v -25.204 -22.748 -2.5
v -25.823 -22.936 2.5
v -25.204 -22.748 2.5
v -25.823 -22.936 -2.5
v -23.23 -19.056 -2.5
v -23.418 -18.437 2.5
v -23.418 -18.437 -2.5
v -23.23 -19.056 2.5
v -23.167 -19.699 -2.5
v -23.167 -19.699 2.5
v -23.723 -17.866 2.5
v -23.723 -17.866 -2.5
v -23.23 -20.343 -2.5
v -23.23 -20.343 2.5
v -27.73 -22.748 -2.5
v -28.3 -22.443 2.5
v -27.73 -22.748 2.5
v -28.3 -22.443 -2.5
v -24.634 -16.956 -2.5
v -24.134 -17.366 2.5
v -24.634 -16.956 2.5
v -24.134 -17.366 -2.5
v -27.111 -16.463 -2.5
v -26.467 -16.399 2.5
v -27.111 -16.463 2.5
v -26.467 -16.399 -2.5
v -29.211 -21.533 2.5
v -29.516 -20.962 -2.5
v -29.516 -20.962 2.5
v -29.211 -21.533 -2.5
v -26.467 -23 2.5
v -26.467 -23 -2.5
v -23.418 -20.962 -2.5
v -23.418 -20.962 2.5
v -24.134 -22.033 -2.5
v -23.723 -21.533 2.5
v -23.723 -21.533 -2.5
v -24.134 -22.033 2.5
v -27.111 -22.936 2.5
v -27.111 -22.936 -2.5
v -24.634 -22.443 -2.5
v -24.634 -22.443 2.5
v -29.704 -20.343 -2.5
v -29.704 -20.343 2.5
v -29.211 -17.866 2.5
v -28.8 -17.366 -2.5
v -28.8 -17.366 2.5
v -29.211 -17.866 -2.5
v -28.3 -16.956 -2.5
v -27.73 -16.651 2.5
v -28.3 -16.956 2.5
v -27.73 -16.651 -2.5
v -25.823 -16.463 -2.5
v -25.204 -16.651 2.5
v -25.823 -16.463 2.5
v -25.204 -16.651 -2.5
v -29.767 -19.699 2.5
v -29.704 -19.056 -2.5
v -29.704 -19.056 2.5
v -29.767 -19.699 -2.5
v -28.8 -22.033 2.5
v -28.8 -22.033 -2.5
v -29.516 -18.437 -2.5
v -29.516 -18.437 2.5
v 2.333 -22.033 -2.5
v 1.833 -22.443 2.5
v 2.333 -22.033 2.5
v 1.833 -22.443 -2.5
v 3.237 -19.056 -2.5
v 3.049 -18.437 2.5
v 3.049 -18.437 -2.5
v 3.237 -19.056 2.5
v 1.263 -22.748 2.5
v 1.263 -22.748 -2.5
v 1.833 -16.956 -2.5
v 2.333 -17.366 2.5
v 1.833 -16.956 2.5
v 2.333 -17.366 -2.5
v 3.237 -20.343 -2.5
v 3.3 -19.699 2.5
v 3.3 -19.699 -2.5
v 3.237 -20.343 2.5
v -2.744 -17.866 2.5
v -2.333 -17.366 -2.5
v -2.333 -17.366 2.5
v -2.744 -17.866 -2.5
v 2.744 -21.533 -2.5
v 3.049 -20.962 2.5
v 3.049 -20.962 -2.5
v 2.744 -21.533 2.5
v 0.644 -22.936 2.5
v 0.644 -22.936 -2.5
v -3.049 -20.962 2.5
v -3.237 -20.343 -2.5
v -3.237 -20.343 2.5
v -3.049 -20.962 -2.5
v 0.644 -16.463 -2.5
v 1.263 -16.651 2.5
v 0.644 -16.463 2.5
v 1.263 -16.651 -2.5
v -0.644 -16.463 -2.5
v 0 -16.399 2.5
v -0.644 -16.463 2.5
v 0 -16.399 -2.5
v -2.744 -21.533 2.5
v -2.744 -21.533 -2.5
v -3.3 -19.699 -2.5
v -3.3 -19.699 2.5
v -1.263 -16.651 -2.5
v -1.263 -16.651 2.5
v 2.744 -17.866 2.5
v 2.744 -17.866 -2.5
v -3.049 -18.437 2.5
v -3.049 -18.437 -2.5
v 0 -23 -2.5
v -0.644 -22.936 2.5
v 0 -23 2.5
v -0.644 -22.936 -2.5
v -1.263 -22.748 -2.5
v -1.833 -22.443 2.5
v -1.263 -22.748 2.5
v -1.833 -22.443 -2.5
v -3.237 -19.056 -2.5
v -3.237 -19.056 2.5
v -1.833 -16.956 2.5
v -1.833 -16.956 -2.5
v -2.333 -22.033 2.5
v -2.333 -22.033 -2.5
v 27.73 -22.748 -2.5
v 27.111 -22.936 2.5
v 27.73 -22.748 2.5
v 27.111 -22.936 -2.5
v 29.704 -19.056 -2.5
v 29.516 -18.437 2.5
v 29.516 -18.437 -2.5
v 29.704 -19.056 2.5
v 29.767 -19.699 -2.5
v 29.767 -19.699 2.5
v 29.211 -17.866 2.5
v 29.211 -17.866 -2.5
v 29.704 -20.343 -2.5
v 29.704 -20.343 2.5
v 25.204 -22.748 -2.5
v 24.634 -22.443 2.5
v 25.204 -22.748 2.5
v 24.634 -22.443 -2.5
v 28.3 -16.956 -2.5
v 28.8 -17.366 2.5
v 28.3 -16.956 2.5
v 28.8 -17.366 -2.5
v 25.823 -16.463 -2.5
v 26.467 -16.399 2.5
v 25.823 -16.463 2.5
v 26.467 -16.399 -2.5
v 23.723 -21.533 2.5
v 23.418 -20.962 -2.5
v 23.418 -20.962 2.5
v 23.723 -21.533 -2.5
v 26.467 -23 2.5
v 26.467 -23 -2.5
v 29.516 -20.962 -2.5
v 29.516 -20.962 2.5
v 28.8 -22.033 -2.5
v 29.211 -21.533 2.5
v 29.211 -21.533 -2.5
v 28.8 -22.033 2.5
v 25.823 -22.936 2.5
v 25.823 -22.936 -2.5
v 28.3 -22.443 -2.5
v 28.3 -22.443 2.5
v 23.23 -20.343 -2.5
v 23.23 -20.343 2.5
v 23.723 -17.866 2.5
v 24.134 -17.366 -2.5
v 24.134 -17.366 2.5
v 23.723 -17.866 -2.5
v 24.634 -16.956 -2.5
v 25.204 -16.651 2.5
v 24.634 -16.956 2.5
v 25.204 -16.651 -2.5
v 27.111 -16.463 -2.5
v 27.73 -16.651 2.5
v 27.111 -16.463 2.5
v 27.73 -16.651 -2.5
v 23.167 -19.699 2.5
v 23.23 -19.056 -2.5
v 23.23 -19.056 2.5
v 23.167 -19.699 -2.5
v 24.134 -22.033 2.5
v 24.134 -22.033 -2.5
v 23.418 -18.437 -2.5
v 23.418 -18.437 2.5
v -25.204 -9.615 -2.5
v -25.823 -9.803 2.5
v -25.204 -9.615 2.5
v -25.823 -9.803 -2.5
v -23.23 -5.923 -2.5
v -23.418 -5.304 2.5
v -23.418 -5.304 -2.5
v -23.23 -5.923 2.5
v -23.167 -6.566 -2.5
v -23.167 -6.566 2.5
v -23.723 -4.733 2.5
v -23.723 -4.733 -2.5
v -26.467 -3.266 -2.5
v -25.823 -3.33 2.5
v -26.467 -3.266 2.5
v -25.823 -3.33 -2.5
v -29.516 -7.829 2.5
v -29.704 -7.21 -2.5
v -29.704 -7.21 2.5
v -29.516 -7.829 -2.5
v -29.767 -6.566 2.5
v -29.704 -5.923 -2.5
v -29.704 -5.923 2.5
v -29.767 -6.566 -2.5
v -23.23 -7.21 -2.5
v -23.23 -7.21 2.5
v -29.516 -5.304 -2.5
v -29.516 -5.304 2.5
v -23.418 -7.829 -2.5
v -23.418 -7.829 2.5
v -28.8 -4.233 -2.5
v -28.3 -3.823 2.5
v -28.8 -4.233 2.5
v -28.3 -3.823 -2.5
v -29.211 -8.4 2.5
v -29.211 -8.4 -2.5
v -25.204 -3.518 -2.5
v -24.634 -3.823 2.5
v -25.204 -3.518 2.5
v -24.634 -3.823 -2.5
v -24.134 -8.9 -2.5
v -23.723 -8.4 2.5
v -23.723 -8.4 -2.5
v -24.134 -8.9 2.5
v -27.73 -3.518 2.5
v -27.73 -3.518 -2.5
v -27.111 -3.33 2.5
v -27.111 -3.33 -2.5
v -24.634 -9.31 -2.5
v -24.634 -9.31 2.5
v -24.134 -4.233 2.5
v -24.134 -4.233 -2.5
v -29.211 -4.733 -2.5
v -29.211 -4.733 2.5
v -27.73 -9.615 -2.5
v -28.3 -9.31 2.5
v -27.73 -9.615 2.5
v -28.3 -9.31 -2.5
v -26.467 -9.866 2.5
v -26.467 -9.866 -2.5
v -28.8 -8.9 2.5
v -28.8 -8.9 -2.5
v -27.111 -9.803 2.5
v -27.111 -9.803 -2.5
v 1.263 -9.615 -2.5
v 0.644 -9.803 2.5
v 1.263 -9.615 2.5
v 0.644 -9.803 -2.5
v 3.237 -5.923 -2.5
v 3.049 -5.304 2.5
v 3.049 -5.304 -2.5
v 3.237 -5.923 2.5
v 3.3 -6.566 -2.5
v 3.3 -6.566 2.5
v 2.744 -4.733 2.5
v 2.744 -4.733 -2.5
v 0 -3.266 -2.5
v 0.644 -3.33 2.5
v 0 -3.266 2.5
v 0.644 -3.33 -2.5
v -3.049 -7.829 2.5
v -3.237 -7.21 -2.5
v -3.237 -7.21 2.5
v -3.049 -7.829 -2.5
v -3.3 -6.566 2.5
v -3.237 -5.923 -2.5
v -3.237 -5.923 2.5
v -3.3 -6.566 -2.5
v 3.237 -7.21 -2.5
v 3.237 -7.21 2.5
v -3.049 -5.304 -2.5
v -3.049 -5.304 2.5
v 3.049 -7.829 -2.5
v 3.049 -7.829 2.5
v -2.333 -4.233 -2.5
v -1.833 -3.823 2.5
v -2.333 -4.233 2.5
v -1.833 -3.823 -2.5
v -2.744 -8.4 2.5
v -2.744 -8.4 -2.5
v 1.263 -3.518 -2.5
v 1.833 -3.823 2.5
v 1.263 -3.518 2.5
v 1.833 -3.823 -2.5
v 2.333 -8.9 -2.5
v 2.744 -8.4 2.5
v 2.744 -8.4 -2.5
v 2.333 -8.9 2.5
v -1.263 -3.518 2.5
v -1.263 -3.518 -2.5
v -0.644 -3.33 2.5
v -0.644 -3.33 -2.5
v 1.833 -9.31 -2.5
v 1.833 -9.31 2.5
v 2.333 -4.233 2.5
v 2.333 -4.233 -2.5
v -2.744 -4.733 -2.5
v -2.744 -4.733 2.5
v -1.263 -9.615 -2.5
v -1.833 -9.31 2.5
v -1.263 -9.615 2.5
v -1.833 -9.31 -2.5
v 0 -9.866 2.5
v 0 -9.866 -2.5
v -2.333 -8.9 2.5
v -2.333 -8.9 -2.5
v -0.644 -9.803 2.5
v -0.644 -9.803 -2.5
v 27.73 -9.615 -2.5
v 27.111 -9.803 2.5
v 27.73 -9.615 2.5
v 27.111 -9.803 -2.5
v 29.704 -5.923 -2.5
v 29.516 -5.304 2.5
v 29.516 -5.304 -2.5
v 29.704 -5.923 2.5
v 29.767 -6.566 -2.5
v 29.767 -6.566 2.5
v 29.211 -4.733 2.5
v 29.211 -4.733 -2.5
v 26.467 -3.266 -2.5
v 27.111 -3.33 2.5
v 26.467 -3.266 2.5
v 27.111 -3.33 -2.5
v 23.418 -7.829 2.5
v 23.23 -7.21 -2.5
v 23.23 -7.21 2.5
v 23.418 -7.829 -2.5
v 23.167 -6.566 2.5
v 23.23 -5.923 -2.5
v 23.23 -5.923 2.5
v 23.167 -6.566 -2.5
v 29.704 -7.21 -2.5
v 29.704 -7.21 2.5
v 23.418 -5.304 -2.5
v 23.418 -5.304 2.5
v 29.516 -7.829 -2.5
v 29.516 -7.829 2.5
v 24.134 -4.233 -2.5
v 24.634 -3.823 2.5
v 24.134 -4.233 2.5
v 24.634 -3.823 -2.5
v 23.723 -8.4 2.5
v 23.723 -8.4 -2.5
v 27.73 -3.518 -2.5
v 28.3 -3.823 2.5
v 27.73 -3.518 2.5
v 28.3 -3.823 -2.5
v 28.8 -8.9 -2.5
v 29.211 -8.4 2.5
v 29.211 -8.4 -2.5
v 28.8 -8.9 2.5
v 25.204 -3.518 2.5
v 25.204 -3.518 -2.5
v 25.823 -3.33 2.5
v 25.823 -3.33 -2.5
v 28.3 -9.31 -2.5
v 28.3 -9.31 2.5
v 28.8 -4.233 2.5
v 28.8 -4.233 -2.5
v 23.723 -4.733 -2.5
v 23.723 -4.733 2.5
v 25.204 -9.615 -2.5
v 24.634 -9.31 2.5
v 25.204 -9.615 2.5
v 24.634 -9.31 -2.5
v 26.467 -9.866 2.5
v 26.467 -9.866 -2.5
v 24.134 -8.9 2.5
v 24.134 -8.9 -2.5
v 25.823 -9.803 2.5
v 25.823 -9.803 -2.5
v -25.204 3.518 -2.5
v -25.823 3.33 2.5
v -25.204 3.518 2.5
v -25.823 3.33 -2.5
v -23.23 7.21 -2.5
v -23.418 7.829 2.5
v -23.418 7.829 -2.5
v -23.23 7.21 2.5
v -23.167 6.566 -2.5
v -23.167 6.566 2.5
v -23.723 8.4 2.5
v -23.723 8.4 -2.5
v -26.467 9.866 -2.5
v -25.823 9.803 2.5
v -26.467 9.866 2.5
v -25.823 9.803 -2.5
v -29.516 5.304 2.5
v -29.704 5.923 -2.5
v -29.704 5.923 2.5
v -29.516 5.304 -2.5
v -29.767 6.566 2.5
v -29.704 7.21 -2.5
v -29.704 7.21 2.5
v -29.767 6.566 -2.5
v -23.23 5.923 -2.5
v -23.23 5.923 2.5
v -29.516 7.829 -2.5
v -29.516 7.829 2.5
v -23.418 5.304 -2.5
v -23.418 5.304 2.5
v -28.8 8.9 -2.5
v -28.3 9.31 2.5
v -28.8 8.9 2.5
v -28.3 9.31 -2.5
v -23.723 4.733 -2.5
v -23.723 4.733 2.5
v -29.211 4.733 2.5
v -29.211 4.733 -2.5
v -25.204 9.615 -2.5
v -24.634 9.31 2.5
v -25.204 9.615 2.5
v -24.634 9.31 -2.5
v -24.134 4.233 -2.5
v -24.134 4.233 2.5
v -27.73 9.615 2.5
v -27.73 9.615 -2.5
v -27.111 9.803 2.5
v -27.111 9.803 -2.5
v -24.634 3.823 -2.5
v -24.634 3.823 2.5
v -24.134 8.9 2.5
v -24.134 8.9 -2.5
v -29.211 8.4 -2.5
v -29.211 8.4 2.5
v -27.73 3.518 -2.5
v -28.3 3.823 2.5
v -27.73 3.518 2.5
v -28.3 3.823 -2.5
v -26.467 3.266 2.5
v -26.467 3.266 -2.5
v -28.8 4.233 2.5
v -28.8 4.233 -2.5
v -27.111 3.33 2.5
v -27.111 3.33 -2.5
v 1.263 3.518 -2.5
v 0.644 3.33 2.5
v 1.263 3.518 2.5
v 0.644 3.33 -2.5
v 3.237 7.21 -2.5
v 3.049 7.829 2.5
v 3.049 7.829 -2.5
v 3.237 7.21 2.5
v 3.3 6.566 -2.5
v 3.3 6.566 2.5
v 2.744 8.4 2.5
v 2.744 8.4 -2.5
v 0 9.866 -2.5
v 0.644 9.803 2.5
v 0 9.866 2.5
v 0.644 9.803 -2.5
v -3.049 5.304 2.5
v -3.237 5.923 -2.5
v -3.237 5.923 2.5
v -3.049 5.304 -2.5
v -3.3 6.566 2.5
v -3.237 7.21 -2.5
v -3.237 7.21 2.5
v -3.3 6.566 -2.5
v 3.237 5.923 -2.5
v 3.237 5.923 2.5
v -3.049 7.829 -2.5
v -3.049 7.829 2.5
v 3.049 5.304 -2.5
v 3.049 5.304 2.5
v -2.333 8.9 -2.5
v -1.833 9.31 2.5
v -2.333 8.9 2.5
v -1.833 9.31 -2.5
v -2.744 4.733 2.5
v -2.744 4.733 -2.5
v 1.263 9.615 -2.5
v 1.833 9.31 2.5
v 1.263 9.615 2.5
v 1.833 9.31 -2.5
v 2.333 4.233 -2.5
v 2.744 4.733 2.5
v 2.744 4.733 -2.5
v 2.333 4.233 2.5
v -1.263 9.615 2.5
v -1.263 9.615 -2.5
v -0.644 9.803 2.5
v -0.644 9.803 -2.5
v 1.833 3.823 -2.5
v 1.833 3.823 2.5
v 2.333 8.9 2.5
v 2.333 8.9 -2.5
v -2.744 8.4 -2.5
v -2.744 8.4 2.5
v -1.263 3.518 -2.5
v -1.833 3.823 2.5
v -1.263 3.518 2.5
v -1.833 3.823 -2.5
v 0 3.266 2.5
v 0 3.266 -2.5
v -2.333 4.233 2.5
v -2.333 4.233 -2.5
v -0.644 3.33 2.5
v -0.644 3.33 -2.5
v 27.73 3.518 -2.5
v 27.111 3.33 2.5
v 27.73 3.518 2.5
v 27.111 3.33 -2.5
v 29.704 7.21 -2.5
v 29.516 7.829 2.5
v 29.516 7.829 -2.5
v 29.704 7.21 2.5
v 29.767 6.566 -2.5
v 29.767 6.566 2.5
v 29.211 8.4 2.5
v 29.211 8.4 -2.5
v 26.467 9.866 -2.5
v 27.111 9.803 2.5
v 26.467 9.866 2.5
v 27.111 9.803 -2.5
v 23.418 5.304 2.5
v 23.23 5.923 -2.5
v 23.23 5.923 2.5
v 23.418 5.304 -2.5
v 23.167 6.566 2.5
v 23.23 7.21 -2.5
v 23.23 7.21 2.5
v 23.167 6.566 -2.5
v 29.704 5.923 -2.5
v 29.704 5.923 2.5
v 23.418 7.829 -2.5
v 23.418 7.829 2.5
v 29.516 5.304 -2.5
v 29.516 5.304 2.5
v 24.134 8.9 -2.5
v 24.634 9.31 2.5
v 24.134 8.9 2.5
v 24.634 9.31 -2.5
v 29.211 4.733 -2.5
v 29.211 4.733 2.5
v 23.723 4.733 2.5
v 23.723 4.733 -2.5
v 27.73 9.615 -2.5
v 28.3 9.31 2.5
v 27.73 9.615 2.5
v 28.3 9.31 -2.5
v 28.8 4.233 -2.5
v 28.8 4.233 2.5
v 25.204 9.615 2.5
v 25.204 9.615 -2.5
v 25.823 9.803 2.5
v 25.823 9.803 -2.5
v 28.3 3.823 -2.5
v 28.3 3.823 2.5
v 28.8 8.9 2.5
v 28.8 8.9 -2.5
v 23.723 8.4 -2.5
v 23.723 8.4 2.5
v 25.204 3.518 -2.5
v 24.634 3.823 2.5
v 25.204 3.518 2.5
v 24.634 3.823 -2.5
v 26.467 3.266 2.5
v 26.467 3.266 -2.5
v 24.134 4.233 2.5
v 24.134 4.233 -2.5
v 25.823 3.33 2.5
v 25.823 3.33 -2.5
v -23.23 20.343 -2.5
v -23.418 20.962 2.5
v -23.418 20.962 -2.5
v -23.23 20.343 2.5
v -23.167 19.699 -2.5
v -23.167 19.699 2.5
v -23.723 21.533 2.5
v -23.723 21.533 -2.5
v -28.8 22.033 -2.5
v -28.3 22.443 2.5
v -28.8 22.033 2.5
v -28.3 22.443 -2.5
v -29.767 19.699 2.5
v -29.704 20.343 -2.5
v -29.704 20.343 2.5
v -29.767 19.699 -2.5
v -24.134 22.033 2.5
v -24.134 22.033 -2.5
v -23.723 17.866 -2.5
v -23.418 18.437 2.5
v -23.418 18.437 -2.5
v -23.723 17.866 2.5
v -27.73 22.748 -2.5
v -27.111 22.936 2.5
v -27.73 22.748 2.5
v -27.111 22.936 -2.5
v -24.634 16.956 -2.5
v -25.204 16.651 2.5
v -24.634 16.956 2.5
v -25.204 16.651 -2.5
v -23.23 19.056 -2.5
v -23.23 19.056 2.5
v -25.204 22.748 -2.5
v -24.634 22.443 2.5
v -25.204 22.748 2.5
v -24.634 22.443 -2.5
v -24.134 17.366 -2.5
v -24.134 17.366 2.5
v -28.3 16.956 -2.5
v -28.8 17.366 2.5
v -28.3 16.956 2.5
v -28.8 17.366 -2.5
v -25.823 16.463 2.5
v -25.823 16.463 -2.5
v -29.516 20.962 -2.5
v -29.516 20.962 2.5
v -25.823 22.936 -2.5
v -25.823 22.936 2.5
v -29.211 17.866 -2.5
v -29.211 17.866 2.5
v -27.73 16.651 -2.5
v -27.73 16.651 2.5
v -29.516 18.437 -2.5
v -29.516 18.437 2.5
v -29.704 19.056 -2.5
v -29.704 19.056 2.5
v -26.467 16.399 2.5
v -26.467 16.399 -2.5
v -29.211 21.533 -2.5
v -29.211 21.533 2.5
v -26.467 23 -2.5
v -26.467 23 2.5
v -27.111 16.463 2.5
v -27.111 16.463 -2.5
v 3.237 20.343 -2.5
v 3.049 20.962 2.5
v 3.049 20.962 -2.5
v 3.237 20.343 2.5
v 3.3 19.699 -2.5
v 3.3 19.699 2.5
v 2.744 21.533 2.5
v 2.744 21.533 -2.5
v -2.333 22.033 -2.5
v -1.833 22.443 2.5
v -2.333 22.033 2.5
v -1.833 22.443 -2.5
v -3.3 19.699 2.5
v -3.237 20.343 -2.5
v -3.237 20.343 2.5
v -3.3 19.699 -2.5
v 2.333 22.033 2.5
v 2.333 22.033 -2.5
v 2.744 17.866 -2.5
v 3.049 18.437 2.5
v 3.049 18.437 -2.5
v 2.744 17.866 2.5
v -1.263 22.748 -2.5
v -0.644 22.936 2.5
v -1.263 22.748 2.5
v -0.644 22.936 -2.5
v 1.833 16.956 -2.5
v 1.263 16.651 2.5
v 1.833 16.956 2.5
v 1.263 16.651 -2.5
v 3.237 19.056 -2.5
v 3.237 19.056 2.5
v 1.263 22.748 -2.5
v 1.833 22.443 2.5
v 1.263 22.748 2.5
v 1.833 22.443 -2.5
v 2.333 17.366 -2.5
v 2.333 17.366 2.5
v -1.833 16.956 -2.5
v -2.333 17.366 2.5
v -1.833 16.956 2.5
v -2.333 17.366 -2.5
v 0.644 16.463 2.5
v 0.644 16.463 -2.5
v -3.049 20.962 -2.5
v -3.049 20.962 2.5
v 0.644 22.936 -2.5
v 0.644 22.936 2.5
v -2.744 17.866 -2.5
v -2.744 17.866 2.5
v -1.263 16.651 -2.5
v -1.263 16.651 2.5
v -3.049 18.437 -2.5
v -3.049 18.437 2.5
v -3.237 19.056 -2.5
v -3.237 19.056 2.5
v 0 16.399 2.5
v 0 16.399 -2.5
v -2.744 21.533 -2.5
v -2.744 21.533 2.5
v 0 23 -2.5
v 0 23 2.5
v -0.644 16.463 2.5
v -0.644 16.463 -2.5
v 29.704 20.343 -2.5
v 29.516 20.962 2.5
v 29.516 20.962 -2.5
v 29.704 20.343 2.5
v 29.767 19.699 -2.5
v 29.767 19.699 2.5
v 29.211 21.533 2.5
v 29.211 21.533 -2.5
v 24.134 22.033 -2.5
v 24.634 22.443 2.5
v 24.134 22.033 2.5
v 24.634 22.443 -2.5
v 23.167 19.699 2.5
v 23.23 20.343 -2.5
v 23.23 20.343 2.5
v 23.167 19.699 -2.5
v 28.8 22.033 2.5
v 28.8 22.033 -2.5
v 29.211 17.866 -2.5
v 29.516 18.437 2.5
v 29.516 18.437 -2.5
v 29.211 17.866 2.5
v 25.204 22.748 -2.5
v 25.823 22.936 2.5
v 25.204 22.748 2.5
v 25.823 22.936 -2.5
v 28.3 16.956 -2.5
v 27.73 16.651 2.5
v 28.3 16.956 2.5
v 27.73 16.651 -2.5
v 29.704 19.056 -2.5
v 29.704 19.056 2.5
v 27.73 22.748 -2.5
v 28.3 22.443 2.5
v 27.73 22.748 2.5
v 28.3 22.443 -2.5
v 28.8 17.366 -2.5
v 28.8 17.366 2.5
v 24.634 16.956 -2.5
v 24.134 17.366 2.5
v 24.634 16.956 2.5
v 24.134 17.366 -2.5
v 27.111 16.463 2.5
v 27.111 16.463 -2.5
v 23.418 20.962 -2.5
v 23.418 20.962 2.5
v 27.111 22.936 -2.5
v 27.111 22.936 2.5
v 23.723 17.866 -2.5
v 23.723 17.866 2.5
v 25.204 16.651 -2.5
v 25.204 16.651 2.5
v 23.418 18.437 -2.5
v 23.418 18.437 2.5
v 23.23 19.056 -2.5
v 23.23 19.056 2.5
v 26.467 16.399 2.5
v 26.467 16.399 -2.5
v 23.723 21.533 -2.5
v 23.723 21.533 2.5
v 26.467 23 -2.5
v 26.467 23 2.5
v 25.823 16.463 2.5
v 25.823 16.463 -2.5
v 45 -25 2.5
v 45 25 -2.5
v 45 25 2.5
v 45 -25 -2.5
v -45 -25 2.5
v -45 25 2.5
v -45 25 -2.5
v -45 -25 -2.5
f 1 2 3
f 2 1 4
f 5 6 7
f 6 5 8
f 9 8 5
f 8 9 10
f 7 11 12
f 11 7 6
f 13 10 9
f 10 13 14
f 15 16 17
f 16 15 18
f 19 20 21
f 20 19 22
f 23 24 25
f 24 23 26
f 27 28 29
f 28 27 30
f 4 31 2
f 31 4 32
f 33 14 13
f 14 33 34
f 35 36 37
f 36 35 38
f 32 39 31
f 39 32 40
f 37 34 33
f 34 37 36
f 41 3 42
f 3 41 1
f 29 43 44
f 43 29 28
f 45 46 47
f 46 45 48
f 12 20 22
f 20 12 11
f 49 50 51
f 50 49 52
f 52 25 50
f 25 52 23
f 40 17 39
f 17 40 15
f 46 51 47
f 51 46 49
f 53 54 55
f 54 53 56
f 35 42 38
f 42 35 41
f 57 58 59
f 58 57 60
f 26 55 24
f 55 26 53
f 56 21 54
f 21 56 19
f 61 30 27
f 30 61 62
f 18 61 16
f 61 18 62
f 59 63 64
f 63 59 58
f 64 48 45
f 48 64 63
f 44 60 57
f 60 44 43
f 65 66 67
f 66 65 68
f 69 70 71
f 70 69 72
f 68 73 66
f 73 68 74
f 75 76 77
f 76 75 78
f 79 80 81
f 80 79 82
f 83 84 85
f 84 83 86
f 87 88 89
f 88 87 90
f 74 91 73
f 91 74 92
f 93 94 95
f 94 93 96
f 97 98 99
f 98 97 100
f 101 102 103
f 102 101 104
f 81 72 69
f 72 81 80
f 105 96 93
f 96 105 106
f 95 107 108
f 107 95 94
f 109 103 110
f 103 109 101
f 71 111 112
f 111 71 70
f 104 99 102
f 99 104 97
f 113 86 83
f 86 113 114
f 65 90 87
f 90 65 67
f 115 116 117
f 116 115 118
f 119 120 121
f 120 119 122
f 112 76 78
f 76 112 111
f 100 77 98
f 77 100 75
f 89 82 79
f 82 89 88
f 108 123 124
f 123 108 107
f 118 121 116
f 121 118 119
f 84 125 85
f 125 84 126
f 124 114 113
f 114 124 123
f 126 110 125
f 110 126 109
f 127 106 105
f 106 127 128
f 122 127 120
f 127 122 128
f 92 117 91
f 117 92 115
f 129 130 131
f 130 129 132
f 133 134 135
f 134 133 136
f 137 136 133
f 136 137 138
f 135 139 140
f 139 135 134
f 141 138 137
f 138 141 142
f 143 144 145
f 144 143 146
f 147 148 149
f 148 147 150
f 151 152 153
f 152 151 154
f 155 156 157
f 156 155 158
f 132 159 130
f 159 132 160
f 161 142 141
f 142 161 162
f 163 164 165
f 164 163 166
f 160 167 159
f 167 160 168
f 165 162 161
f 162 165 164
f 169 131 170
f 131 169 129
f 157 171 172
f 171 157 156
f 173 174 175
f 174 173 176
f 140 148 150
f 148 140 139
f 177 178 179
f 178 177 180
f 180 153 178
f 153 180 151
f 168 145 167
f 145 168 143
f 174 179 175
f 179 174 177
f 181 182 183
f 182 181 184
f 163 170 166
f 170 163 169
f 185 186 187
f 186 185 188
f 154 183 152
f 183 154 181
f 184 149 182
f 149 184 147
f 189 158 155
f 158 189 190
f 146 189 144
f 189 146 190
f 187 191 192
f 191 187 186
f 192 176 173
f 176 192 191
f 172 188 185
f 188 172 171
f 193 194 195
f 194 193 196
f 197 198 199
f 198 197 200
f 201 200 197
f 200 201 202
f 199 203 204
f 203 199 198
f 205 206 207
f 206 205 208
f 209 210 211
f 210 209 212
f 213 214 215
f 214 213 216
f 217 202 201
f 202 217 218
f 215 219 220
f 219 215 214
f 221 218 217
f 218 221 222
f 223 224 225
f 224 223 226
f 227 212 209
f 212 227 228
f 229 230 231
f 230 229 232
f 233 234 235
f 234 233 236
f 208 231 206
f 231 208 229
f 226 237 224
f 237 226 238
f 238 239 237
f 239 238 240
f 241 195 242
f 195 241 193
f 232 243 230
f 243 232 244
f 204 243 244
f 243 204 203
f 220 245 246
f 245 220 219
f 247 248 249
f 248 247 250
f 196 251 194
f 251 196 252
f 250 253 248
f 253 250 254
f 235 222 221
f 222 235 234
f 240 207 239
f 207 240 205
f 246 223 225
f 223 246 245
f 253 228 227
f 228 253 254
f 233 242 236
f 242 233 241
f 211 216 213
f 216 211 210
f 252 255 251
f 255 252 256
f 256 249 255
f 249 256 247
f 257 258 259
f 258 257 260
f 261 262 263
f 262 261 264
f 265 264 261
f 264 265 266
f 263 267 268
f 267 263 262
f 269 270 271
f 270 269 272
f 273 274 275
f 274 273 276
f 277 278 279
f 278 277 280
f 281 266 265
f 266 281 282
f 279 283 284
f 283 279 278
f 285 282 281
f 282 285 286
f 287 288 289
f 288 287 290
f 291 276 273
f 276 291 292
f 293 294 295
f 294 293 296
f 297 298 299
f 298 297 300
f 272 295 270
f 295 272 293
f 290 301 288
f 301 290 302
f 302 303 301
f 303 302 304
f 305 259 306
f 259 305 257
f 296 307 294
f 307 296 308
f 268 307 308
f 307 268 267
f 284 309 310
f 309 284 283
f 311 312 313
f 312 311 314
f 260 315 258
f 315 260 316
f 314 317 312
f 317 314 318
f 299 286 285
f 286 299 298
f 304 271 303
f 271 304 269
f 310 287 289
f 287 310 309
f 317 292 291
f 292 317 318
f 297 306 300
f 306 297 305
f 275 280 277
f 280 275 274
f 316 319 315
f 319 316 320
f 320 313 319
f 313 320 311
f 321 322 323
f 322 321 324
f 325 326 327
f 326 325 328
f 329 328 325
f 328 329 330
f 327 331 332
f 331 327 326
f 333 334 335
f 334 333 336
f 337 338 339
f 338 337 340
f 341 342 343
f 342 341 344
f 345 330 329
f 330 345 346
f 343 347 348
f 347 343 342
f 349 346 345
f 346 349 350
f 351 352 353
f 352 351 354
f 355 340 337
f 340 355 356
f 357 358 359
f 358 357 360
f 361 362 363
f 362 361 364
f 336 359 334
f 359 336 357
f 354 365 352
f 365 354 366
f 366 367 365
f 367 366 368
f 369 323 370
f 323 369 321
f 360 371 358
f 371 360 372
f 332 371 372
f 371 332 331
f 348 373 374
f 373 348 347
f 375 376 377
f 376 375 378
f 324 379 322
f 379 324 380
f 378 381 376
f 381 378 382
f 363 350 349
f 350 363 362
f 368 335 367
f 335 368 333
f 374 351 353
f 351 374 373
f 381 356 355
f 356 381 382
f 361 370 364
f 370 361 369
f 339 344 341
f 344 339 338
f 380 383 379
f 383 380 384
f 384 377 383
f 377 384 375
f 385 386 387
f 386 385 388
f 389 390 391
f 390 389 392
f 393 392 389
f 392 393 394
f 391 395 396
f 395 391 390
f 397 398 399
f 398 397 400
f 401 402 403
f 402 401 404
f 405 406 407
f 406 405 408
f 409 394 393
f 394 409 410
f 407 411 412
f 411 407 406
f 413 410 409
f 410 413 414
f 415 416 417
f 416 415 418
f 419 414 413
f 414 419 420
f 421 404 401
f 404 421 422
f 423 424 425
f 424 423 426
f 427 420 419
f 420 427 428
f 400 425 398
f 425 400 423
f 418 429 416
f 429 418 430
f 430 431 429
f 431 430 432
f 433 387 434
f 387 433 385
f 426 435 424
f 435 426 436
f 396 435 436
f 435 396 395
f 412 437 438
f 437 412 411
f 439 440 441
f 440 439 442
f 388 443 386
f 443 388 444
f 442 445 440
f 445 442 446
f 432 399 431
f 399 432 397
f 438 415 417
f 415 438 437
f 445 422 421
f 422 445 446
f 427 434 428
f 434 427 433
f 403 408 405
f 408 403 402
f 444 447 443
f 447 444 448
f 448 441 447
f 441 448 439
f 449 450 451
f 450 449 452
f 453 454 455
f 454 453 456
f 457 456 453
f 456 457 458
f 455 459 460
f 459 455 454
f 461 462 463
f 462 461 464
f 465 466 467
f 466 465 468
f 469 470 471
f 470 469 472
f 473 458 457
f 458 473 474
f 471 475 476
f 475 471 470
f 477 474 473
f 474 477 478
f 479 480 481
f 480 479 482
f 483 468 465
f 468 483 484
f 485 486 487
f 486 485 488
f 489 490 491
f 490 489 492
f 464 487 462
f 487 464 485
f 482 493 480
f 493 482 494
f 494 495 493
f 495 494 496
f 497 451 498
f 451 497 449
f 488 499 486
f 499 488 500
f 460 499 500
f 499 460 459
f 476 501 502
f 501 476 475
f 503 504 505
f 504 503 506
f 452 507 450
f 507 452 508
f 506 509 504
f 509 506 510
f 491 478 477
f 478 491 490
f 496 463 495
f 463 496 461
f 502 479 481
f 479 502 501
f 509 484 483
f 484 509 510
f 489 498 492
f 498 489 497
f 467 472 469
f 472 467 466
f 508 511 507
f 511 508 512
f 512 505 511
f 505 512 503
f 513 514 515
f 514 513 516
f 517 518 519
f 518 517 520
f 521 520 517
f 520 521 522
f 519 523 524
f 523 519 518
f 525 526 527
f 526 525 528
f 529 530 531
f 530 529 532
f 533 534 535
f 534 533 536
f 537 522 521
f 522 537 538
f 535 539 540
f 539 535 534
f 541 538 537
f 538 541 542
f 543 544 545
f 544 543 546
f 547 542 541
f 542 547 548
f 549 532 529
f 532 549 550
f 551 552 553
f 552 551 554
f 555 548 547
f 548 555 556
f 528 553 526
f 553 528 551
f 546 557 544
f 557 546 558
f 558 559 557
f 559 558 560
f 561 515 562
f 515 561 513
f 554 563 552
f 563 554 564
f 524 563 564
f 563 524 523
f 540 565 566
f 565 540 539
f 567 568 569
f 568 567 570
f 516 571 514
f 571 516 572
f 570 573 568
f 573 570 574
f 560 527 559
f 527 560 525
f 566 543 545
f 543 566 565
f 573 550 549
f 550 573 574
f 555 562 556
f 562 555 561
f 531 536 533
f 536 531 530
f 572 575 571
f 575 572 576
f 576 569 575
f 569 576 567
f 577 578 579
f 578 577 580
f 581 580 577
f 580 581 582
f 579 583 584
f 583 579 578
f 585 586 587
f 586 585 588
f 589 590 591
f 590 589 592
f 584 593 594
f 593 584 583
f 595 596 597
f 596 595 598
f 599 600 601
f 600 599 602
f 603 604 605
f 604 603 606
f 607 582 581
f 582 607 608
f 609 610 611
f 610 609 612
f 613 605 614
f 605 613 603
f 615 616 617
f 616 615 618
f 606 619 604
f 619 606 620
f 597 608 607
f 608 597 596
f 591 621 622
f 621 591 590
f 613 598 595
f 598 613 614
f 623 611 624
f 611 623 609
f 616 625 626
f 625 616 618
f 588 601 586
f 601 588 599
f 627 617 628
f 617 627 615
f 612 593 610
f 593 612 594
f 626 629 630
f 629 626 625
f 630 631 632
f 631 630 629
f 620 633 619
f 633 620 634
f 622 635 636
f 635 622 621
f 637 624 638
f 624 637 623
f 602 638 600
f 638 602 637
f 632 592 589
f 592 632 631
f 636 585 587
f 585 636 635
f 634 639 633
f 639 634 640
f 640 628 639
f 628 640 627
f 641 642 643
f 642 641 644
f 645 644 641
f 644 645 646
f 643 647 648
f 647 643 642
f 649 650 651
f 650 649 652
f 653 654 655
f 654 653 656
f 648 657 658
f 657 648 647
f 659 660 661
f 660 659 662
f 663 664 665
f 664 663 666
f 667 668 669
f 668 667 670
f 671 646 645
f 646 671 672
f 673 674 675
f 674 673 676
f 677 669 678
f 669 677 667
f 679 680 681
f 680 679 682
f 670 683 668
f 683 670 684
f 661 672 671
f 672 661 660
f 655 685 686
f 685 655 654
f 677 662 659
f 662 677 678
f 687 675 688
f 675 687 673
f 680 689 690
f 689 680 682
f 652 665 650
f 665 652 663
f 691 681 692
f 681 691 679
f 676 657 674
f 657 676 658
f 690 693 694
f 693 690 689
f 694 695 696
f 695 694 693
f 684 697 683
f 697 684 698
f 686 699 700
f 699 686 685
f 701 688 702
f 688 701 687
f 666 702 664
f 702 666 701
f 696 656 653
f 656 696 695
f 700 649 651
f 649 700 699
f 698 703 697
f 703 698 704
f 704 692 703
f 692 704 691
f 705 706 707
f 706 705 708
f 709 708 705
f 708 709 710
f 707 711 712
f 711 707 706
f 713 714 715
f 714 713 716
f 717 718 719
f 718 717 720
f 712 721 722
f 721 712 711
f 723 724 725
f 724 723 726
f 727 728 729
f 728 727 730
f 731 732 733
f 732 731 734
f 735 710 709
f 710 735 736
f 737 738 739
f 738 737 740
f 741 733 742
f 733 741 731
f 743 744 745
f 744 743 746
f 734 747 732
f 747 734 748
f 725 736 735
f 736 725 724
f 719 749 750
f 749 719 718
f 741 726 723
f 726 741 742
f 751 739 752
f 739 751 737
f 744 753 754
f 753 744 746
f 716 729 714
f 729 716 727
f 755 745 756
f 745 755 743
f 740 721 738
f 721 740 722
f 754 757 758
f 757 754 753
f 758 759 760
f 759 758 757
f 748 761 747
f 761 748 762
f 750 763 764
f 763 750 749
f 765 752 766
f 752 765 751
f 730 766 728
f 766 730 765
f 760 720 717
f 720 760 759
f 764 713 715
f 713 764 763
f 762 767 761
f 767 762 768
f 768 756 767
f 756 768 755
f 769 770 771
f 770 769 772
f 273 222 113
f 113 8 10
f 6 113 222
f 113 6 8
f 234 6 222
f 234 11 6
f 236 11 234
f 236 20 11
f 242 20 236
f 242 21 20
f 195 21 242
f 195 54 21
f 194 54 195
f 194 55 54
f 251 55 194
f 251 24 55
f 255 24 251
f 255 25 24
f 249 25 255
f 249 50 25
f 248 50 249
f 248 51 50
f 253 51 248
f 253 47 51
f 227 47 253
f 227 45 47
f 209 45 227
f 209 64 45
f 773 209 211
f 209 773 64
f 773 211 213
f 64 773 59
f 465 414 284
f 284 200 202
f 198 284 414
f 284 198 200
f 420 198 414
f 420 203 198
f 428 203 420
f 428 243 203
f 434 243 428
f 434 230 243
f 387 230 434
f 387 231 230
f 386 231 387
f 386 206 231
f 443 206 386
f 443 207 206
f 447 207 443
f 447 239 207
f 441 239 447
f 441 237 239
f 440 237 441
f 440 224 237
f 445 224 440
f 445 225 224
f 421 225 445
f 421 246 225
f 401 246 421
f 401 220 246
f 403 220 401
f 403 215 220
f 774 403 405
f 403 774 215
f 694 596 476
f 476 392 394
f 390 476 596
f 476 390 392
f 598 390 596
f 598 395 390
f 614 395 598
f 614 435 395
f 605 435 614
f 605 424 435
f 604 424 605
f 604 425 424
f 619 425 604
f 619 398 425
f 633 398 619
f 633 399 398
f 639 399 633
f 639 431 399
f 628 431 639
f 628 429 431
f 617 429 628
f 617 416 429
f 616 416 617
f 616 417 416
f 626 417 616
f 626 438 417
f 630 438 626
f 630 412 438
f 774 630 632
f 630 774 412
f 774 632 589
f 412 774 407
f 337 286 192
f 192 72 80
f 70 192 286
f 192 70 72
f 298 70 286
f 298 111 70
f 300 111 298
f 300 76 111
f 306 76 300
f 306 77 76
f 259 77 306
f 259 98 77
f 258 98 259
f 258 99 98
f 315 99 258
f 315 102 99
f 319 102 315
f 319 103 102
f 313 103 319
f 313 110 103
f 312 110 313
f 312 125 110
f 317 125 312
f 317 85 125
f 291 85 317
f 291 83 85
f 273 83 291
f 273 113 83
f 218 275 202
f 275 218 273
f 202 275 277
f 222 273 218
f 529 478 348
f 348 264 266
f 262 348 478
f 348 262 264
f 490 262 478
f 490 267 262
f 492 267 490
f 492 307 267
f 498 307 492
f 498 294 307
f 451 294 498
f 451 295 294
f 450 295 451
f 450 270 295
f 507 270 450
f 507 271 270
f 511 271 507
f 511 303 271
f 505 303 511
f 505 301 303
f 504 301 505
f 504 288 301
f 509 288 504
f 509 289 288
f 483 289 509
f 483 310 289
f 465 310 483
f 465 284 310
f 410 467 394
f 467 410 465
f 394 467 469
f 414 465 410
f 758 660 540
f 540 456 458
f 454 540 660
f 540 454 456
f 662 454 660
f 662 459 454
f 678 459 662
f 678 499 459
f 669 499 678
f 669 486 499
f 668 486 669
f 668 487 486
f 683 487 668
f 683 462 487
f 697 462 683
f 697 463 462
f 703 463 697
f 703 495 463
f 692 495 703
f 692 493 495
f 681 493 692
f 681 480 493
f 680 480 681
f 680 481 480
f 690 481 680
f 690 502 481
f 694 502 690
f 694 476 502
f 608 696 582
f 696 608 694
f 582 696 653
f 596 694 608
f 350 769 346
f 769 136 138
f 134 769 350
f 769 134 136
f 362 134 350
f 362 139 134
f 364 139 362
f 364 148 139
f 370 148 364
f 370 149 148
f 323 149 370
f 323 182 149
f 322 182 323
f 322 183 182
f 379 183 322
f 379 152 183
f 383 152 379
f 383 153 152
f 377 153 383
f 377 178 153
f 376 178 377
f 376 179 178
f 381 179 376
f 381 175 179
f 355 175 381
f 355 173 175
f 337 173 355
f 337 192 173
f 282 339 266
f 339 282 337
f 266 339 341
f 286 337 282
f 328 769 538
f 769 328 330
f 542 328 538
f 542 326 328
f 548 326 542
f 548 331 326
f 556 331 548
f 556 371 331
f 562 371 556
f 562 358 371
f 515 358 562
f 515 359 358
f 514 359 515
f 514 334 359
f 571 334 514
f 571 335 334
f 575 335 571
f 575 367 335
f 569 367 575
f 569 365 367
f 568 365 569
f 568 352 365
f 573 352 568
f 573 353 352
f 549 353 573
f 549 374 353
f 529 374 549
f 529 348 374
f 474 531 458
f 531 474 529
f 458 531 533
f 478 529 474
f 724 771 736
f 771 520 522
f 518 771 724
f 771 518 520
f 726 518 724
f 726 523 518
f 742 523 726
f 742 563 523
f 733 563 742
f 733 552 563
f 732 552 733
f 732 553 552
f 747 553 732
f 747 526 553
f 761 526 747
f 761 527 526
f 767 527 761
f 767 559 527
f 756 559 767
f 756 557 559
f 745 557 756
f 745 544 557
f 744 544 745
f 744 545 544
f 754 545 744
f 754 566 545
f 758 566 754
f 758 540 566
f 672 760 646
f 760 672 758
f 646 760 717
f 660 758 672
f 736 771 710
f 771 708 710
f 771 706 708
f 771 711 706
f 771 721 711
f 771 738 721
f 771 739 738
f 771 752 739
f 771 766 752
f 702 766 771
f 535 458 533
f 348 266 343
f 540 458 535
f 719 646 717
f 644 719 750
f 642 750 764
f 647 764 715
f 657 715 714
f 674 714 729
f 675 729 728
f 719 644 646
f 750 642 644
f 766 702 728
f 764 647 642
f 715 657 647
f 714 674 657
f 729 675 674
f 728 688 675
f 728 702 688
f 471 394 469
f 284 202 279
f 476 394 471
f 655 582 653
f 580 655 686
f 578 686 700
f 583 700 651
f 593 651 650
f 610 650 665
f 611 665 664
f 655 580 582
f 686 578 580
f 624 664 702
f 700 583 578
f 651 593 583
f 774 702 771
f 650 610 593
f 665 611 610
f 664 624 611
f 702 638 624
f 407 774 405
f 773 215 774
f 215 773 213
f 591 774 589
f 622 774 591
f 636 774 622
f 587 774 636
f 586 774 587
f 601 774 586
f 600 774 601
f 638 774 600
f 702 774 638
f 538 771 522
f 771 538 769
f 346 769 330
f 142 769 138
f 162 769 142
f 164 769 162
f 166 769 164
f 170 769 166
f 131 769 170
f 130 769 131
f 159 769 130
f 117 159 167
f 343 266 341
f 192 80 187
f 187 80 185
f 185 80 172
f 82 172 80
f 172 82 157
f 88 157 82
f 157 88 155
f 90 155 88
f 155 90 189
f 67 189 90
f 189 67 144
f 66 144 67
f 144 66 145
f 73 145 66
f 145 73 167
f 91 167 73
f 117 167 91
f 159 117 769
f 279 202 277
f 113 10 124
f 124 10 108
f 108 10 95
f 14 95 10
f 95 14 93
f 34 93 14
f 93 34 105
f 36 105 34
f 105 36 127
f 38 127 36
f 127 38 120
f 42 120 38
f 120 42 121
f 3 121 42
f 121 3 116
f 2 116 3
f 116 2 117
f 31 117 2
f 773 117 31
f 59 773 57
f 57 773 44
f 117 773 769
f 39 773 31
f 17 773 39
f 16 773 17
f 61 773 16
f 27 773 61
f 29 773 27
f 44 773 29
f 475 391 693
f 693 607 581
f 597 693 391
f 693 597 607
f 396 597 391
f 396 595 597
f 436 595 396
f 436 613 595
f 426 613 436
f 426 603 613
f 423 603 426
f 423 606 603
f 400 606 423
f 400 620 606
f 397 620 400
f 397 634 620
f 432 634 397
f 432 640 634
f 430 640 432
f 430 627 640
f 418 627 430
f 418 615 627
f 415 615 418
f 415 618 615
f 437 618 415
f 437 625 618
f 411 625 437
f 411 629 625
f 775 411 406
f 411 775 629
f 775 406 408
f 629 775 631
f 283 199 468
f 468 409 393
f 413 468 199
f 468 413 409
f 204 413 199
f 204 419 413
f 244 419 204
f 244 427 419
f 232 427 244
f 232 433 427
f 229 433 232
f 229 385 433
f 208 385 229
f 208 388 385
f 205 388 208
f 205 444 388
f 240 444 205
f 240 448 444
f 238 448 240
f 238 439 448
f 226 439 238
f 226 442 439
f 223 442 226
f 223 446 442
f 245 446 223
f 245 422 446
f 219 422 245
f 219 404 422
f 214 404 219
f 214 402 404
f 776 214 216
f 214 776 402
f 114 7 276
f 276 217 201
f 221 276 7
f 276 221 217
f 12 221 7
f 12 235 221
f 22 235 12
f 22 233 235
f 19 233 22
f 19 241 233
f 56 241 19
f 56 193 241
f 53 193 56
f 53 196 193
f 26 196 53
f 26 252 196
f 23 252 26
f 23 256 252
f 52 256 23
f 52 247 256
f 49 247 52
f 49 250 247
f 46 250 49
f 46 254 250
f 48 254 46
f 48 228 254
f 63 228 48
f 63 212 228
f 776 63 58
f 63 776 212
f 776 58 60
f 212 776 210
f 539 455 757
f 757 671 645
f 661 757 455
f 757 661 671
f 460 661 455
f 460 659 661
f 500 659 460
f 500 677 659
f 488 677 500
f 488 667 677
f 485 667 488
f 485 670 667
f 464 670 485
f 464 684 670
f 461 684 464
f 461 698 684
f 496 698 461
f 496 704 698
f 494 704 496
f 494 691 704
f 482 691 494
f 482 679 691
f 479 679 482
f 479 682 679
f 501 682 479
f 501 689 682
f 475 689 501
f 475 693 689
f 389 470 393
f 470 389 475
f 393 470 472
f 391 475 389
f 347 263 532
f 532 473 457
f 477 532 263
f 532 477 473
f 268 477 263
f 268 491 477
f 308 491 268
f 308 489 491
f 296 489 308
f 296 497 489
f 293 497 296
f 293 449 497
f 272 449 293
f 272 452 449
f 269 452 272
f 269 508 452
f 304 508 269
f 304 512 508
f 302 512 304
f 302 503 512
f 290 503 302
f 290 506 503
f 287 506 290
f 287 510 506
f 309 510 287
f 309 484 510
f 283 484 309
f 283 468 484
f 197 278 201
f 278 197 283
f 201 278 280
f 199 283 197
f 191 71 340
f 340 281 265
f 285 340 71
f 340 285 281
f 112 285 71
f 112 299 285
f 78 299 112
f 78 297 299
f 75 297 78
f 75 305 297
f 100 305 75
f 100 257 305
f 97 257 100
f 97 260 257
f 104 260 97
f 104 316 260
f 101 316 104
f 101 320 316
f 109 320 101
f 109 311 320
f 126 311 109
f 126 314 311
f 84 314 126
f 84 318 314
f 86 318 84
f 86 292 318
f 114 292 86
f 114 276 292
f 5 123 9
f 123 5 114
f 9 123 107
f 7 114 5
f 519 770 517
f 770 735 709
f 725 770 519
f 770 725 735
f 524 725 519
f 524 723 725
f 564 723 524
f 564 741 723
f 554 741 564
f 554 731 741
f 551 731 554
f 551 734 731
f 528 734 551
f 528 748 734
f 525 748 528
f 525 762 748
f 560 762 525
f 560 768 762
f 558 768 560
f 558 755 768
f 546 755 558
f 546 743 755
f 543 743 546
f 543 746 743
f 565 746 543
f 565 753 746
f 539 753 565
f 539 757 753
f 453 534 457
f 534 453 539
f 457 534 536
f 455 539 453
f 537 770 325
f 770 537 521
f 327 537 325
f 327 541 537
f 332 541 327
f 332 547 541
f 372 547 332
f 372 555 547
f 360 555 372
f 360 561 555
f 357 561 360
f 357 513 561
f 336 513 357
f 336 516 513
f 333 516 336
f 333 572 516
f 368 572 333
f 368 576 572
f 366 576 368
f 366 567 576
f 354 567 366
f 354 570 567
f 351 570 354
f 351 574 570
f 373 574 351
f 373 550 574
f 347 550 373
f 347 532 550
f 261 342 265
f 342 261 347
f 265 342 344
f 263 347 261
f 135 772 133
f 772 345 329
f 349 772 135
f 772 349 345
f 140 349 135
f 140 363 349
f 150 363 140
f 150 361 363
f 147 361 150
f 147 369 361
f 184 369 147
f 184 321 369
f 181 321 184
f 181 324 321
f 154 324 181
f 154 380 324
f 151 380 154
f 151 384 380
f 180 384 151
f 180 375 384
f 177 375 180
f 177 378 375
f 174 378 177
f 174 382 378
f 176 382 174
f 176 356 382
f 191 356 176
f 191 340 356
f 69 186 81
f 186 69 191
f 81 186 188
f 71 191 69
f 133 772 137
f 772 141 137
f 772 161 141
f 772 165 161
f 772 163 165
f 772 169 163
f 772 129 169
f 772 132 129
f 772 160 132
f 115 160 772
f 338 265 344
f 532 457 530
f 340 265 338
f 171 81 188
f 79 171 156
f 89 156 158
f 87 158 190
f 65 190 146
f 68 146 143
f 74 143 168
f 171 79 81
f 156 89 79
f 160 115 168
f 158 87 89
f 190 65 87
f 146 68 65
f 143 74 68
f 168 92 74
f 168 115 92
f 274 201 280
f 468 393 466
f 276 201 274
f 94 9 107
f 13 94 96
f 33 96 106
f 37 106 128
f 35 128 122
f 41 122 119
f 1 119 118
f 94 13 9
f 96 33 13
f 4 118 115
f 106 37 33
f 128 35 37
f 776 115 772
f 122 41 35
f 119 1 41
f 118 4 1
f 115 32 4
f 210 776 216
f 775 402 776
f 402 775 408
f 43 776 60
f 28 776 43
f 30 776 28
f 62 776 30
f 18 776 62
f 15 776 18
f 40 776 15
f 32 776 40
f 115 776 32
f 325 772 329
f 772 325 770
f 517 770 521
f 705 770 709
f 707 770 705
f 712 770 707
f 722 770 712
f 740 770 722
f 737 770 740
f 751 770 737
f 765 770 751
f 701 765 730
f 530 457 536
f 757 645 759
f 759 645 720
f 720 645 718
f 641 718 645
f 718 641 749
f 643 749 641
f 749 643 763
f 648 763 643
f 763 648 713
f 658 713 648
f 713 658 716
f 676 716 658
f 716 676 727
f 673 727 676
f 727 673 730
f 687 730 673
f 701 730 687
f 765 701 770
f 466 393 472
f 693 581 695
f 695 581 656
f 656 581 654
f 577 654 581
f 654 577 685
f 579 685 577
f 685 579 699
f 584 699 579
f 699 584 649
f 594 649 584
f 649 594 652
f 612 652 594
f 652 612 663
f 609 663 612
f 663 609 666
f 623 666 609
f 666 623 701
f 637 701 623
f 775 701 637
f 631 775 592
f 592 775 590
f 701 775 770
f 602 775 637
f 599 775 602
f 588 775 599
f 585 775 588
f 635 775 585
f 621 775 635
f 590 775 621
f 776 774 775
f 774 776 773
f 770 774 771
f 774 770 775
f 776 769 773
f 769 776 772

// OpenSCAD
$fn = 32;

// ----------------------------------------------------------------------
// Perforated panel 90 x 50 x 5
// 4 x 3 Ø6.6 holes, grid layout
// ----------------------------------------------------------------------

// --- parameters (mm) ---
panel = [90, 50, 5];  // overall size (x, y, z)
hole_d = 6.6;         // hole diameter
pitch_x = 26.467;     // hole pitch along X
pitch_y = 13.133;     // hole pitch along Y

// --- derived feature positions (mm) ---
margin = hole_d / 2 + 2;            // = 5.3   clearance from the panel edge
cols = floor((panel[0] - 2 * margin) / pitch_x) + 1;  // = 3   how many columns fit in X
rows = floor((panel[1] - 2 * margin) / pitch_y) + 1;  // = 4   how many rows fit in Y
span_x = (cols - 1) * pitch_x + 0;  // = 52.93   width of the field
span_y = (rows - 1) * pitch_y;      // = 39.4   height of the field
origin_x = -span_x / 2;             // = -26.47   X of the first hole
origin_y = -span_y / 2;             // = -19.7   Y of the first row
holes = rows * cols;                // = 12   holes in total
feature_centers = [
  [origin_x + 0 * pitch_x, origin_y + 0 * pitch_y],
  [origin_x + 1 * pitch_x, origin_y + 0 * pitch_y],
  [origin_x + 2 * pitch_x, origin_y + 0 * pitch_y],
  [origin_x + 0 * pitch_x, origin_y + 1 * pitch_y],
  [origin_x + 1 * pitch_x, origin_y + 1 * pitch_y],
  [origin_x + 2 * pitch_x, origin_y + 1 * pitch_y],
  [origin_x + 0 * pitch_x, origin_y + 2 * pitch_y],
  [origin_x + 1 * pitch_x, origin_y + 2 * pitch_y],
  [origin_x + 2 * pitch_x, origin_y + 2 * pitch_y],
  [origin_x + 0 * pitch_x, origin_y + 3 * pitch_y],
  [origin_x + 1 * pitch_x, origin_y + 3 * pitch_y],
  [origin_x + 2 * pitch_x, origin_y + 3 * pitch_y]
];   // hole centres, used verbatim by the cutter loop

// panel outline, every hole through
difference() {
  cube(panel, center = true);
  for (centre = feature_centers)
    translate([centre[0], centre[1], 0])
      cylinder(d = hole_d, h = panel[2] + 2, center = true);
}
